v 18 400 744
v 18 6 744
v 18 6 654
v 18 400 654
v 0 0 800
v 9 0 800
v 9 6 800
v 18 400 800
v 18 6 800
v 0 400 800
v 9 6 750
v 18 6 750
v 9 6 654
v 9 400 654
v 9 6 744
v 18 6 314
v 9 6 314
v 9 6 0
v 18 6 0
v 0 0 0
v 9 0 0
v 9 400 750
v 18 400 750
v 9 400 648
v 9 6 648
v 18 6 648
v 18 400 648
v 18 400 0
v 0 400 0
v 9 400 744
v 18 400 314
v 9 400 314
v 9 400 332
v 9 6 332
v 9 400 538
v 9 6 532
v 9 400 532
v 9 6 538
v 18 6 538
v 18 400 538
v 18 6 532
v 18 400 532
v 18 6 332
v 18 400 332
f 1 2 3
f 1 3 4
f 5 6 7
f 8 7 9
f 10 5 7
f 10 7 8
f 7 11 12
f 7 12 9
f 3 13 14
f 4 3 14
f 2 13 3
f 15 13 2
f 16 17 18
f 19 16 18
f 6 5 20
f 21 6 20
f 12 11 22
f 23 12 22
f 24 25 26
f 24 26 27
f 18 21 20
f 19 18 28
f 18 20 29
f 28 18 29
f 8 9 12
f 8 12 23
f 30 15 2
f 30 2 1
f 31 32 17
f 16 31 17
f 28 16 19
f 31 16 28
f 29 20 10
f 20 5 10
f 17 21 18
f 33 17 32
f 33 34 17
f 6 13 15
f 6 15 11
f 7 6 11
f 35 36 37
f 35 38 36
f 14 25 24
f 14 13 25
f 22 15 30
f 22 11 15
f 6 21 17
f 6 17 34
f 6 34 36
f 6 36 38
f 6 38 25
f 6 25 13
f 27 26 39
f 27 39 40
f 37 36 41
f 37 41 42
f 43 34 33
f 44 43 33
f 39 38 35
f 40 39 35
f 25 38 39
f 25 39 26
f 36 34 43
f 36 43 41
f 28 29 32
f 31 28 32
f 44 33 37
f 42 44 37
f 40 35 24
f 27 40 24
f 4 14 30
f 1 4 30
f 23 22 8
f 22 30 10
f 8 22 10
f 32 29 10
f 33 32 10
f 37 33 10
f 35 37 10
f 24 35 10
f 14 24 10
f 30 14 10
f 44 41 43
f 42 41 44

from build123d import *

# Parameters (mm, degrees)
F0_W     = 394
F0_H     = 50
F1_DEPTH = 18
F0_H_2   = 90
F0_H_3   = 110
F0_H_4   = 200
F0_W_2   = 6
F0_H_5   = 314
F0_H_6   = 18
F0_H_7   = 6
F2_DEPTH = 9


with BuildPart() as f1:
    # F0 (on Right) → F1 (new body)
    with BuildSketch(Plane.YZ):
        with Locations((203, 775)):
            Rectangle(F0_W, F0_H)
    extrude(amount=F1_DEPTH)



with BuildPart() as f1b:
    # F0 (on Right) → F1, piece 2 (new body)
    with BuildSketch(Plane.YZ):
        with Locations((203, 699)):
            Rectangle(F0_W, F0_H_2)
    extrude(amount=F1_DEPTH)


with BuildPart() as f1c:
    # F0 (on Right) → F1, piece 3 (new body)
    with BuildSketch(Plane.YZ):
        with Locations((203, 593)):
            Rectangle(F0_W, F0_H_3)
    extrude(amount=F1_DEPTH)


with BuildPart() as f1d:
    # F0 (on Right) → F1, piece 4 (new body)
    with BuildSketch(Plane.YZ):
        with Locations((203, 432)):
            Rectangle(F0_W, F0_H_4)
    extrude(amount=F1_DEPTH)


with BuildPart() as f1e:
    # F0 (on Right) → F1, piece 5 (new body)
    with BuildSketch(Plane.YZ):
        Polygon((6, 314), (6, 0), (394, 0), (400, 0), (400, 314), align=None)
    extrude(amount=F1_DEPTH)


with BuildPart() as f1_1:
    add(f1.part)

    add(f1b.part)  # F2 merges F1b

    add(f1c.part)  # F2 merges F1c

    add(f1d.part)  # F2 merges F1d

    add(f1e.part)  # F2 merges F1e
    # F0 (on Right) → F2 (join)
    with BuildSketch(Plane.YZ):
        with Locations((3, 157)):
            Rectangle(F0_W_2, F0_H_5)
        with Locations((3, 323)):
            Rectangle(F0_W_2, F0_H_6)
        with Locations((203, 323)):
            Rectangle(F0_W, F0_H_6)
        with Locations((3, 432)):
            Rectangle(F0_W_2, F0_H_4)
        with Locations((203, 535)):
            Rectangle(F0_W, F0_H_7)
        with Locations((203, 651)):
            Rectangle(F0_W, F0_H_7)
        with Locations((3, 593)):
            Rectangle(F0_W_2, F0_H_3)
        with Locations((3, 651)):
            Rectangle(F0_W_2, F0_H_7)
        with Locations((3, 775)):
            Rectangle(F0_W_2, F0_H)
        with Locations((3, 747)):
            Rectangle(F0_W_2, F0_H_7)
        with Locations((3, 699)):
            Rectangle(F0_W_2, F0_H_2)
        with Locations((203, 747)):
            Rectangle(F0_W, F0_H_7)
        with Locations((3, 535)):
            Rectangle(F0_W_2, F0_H_7)
    extrude(amount=F2_DEPTH)


solid = f1_1.part
